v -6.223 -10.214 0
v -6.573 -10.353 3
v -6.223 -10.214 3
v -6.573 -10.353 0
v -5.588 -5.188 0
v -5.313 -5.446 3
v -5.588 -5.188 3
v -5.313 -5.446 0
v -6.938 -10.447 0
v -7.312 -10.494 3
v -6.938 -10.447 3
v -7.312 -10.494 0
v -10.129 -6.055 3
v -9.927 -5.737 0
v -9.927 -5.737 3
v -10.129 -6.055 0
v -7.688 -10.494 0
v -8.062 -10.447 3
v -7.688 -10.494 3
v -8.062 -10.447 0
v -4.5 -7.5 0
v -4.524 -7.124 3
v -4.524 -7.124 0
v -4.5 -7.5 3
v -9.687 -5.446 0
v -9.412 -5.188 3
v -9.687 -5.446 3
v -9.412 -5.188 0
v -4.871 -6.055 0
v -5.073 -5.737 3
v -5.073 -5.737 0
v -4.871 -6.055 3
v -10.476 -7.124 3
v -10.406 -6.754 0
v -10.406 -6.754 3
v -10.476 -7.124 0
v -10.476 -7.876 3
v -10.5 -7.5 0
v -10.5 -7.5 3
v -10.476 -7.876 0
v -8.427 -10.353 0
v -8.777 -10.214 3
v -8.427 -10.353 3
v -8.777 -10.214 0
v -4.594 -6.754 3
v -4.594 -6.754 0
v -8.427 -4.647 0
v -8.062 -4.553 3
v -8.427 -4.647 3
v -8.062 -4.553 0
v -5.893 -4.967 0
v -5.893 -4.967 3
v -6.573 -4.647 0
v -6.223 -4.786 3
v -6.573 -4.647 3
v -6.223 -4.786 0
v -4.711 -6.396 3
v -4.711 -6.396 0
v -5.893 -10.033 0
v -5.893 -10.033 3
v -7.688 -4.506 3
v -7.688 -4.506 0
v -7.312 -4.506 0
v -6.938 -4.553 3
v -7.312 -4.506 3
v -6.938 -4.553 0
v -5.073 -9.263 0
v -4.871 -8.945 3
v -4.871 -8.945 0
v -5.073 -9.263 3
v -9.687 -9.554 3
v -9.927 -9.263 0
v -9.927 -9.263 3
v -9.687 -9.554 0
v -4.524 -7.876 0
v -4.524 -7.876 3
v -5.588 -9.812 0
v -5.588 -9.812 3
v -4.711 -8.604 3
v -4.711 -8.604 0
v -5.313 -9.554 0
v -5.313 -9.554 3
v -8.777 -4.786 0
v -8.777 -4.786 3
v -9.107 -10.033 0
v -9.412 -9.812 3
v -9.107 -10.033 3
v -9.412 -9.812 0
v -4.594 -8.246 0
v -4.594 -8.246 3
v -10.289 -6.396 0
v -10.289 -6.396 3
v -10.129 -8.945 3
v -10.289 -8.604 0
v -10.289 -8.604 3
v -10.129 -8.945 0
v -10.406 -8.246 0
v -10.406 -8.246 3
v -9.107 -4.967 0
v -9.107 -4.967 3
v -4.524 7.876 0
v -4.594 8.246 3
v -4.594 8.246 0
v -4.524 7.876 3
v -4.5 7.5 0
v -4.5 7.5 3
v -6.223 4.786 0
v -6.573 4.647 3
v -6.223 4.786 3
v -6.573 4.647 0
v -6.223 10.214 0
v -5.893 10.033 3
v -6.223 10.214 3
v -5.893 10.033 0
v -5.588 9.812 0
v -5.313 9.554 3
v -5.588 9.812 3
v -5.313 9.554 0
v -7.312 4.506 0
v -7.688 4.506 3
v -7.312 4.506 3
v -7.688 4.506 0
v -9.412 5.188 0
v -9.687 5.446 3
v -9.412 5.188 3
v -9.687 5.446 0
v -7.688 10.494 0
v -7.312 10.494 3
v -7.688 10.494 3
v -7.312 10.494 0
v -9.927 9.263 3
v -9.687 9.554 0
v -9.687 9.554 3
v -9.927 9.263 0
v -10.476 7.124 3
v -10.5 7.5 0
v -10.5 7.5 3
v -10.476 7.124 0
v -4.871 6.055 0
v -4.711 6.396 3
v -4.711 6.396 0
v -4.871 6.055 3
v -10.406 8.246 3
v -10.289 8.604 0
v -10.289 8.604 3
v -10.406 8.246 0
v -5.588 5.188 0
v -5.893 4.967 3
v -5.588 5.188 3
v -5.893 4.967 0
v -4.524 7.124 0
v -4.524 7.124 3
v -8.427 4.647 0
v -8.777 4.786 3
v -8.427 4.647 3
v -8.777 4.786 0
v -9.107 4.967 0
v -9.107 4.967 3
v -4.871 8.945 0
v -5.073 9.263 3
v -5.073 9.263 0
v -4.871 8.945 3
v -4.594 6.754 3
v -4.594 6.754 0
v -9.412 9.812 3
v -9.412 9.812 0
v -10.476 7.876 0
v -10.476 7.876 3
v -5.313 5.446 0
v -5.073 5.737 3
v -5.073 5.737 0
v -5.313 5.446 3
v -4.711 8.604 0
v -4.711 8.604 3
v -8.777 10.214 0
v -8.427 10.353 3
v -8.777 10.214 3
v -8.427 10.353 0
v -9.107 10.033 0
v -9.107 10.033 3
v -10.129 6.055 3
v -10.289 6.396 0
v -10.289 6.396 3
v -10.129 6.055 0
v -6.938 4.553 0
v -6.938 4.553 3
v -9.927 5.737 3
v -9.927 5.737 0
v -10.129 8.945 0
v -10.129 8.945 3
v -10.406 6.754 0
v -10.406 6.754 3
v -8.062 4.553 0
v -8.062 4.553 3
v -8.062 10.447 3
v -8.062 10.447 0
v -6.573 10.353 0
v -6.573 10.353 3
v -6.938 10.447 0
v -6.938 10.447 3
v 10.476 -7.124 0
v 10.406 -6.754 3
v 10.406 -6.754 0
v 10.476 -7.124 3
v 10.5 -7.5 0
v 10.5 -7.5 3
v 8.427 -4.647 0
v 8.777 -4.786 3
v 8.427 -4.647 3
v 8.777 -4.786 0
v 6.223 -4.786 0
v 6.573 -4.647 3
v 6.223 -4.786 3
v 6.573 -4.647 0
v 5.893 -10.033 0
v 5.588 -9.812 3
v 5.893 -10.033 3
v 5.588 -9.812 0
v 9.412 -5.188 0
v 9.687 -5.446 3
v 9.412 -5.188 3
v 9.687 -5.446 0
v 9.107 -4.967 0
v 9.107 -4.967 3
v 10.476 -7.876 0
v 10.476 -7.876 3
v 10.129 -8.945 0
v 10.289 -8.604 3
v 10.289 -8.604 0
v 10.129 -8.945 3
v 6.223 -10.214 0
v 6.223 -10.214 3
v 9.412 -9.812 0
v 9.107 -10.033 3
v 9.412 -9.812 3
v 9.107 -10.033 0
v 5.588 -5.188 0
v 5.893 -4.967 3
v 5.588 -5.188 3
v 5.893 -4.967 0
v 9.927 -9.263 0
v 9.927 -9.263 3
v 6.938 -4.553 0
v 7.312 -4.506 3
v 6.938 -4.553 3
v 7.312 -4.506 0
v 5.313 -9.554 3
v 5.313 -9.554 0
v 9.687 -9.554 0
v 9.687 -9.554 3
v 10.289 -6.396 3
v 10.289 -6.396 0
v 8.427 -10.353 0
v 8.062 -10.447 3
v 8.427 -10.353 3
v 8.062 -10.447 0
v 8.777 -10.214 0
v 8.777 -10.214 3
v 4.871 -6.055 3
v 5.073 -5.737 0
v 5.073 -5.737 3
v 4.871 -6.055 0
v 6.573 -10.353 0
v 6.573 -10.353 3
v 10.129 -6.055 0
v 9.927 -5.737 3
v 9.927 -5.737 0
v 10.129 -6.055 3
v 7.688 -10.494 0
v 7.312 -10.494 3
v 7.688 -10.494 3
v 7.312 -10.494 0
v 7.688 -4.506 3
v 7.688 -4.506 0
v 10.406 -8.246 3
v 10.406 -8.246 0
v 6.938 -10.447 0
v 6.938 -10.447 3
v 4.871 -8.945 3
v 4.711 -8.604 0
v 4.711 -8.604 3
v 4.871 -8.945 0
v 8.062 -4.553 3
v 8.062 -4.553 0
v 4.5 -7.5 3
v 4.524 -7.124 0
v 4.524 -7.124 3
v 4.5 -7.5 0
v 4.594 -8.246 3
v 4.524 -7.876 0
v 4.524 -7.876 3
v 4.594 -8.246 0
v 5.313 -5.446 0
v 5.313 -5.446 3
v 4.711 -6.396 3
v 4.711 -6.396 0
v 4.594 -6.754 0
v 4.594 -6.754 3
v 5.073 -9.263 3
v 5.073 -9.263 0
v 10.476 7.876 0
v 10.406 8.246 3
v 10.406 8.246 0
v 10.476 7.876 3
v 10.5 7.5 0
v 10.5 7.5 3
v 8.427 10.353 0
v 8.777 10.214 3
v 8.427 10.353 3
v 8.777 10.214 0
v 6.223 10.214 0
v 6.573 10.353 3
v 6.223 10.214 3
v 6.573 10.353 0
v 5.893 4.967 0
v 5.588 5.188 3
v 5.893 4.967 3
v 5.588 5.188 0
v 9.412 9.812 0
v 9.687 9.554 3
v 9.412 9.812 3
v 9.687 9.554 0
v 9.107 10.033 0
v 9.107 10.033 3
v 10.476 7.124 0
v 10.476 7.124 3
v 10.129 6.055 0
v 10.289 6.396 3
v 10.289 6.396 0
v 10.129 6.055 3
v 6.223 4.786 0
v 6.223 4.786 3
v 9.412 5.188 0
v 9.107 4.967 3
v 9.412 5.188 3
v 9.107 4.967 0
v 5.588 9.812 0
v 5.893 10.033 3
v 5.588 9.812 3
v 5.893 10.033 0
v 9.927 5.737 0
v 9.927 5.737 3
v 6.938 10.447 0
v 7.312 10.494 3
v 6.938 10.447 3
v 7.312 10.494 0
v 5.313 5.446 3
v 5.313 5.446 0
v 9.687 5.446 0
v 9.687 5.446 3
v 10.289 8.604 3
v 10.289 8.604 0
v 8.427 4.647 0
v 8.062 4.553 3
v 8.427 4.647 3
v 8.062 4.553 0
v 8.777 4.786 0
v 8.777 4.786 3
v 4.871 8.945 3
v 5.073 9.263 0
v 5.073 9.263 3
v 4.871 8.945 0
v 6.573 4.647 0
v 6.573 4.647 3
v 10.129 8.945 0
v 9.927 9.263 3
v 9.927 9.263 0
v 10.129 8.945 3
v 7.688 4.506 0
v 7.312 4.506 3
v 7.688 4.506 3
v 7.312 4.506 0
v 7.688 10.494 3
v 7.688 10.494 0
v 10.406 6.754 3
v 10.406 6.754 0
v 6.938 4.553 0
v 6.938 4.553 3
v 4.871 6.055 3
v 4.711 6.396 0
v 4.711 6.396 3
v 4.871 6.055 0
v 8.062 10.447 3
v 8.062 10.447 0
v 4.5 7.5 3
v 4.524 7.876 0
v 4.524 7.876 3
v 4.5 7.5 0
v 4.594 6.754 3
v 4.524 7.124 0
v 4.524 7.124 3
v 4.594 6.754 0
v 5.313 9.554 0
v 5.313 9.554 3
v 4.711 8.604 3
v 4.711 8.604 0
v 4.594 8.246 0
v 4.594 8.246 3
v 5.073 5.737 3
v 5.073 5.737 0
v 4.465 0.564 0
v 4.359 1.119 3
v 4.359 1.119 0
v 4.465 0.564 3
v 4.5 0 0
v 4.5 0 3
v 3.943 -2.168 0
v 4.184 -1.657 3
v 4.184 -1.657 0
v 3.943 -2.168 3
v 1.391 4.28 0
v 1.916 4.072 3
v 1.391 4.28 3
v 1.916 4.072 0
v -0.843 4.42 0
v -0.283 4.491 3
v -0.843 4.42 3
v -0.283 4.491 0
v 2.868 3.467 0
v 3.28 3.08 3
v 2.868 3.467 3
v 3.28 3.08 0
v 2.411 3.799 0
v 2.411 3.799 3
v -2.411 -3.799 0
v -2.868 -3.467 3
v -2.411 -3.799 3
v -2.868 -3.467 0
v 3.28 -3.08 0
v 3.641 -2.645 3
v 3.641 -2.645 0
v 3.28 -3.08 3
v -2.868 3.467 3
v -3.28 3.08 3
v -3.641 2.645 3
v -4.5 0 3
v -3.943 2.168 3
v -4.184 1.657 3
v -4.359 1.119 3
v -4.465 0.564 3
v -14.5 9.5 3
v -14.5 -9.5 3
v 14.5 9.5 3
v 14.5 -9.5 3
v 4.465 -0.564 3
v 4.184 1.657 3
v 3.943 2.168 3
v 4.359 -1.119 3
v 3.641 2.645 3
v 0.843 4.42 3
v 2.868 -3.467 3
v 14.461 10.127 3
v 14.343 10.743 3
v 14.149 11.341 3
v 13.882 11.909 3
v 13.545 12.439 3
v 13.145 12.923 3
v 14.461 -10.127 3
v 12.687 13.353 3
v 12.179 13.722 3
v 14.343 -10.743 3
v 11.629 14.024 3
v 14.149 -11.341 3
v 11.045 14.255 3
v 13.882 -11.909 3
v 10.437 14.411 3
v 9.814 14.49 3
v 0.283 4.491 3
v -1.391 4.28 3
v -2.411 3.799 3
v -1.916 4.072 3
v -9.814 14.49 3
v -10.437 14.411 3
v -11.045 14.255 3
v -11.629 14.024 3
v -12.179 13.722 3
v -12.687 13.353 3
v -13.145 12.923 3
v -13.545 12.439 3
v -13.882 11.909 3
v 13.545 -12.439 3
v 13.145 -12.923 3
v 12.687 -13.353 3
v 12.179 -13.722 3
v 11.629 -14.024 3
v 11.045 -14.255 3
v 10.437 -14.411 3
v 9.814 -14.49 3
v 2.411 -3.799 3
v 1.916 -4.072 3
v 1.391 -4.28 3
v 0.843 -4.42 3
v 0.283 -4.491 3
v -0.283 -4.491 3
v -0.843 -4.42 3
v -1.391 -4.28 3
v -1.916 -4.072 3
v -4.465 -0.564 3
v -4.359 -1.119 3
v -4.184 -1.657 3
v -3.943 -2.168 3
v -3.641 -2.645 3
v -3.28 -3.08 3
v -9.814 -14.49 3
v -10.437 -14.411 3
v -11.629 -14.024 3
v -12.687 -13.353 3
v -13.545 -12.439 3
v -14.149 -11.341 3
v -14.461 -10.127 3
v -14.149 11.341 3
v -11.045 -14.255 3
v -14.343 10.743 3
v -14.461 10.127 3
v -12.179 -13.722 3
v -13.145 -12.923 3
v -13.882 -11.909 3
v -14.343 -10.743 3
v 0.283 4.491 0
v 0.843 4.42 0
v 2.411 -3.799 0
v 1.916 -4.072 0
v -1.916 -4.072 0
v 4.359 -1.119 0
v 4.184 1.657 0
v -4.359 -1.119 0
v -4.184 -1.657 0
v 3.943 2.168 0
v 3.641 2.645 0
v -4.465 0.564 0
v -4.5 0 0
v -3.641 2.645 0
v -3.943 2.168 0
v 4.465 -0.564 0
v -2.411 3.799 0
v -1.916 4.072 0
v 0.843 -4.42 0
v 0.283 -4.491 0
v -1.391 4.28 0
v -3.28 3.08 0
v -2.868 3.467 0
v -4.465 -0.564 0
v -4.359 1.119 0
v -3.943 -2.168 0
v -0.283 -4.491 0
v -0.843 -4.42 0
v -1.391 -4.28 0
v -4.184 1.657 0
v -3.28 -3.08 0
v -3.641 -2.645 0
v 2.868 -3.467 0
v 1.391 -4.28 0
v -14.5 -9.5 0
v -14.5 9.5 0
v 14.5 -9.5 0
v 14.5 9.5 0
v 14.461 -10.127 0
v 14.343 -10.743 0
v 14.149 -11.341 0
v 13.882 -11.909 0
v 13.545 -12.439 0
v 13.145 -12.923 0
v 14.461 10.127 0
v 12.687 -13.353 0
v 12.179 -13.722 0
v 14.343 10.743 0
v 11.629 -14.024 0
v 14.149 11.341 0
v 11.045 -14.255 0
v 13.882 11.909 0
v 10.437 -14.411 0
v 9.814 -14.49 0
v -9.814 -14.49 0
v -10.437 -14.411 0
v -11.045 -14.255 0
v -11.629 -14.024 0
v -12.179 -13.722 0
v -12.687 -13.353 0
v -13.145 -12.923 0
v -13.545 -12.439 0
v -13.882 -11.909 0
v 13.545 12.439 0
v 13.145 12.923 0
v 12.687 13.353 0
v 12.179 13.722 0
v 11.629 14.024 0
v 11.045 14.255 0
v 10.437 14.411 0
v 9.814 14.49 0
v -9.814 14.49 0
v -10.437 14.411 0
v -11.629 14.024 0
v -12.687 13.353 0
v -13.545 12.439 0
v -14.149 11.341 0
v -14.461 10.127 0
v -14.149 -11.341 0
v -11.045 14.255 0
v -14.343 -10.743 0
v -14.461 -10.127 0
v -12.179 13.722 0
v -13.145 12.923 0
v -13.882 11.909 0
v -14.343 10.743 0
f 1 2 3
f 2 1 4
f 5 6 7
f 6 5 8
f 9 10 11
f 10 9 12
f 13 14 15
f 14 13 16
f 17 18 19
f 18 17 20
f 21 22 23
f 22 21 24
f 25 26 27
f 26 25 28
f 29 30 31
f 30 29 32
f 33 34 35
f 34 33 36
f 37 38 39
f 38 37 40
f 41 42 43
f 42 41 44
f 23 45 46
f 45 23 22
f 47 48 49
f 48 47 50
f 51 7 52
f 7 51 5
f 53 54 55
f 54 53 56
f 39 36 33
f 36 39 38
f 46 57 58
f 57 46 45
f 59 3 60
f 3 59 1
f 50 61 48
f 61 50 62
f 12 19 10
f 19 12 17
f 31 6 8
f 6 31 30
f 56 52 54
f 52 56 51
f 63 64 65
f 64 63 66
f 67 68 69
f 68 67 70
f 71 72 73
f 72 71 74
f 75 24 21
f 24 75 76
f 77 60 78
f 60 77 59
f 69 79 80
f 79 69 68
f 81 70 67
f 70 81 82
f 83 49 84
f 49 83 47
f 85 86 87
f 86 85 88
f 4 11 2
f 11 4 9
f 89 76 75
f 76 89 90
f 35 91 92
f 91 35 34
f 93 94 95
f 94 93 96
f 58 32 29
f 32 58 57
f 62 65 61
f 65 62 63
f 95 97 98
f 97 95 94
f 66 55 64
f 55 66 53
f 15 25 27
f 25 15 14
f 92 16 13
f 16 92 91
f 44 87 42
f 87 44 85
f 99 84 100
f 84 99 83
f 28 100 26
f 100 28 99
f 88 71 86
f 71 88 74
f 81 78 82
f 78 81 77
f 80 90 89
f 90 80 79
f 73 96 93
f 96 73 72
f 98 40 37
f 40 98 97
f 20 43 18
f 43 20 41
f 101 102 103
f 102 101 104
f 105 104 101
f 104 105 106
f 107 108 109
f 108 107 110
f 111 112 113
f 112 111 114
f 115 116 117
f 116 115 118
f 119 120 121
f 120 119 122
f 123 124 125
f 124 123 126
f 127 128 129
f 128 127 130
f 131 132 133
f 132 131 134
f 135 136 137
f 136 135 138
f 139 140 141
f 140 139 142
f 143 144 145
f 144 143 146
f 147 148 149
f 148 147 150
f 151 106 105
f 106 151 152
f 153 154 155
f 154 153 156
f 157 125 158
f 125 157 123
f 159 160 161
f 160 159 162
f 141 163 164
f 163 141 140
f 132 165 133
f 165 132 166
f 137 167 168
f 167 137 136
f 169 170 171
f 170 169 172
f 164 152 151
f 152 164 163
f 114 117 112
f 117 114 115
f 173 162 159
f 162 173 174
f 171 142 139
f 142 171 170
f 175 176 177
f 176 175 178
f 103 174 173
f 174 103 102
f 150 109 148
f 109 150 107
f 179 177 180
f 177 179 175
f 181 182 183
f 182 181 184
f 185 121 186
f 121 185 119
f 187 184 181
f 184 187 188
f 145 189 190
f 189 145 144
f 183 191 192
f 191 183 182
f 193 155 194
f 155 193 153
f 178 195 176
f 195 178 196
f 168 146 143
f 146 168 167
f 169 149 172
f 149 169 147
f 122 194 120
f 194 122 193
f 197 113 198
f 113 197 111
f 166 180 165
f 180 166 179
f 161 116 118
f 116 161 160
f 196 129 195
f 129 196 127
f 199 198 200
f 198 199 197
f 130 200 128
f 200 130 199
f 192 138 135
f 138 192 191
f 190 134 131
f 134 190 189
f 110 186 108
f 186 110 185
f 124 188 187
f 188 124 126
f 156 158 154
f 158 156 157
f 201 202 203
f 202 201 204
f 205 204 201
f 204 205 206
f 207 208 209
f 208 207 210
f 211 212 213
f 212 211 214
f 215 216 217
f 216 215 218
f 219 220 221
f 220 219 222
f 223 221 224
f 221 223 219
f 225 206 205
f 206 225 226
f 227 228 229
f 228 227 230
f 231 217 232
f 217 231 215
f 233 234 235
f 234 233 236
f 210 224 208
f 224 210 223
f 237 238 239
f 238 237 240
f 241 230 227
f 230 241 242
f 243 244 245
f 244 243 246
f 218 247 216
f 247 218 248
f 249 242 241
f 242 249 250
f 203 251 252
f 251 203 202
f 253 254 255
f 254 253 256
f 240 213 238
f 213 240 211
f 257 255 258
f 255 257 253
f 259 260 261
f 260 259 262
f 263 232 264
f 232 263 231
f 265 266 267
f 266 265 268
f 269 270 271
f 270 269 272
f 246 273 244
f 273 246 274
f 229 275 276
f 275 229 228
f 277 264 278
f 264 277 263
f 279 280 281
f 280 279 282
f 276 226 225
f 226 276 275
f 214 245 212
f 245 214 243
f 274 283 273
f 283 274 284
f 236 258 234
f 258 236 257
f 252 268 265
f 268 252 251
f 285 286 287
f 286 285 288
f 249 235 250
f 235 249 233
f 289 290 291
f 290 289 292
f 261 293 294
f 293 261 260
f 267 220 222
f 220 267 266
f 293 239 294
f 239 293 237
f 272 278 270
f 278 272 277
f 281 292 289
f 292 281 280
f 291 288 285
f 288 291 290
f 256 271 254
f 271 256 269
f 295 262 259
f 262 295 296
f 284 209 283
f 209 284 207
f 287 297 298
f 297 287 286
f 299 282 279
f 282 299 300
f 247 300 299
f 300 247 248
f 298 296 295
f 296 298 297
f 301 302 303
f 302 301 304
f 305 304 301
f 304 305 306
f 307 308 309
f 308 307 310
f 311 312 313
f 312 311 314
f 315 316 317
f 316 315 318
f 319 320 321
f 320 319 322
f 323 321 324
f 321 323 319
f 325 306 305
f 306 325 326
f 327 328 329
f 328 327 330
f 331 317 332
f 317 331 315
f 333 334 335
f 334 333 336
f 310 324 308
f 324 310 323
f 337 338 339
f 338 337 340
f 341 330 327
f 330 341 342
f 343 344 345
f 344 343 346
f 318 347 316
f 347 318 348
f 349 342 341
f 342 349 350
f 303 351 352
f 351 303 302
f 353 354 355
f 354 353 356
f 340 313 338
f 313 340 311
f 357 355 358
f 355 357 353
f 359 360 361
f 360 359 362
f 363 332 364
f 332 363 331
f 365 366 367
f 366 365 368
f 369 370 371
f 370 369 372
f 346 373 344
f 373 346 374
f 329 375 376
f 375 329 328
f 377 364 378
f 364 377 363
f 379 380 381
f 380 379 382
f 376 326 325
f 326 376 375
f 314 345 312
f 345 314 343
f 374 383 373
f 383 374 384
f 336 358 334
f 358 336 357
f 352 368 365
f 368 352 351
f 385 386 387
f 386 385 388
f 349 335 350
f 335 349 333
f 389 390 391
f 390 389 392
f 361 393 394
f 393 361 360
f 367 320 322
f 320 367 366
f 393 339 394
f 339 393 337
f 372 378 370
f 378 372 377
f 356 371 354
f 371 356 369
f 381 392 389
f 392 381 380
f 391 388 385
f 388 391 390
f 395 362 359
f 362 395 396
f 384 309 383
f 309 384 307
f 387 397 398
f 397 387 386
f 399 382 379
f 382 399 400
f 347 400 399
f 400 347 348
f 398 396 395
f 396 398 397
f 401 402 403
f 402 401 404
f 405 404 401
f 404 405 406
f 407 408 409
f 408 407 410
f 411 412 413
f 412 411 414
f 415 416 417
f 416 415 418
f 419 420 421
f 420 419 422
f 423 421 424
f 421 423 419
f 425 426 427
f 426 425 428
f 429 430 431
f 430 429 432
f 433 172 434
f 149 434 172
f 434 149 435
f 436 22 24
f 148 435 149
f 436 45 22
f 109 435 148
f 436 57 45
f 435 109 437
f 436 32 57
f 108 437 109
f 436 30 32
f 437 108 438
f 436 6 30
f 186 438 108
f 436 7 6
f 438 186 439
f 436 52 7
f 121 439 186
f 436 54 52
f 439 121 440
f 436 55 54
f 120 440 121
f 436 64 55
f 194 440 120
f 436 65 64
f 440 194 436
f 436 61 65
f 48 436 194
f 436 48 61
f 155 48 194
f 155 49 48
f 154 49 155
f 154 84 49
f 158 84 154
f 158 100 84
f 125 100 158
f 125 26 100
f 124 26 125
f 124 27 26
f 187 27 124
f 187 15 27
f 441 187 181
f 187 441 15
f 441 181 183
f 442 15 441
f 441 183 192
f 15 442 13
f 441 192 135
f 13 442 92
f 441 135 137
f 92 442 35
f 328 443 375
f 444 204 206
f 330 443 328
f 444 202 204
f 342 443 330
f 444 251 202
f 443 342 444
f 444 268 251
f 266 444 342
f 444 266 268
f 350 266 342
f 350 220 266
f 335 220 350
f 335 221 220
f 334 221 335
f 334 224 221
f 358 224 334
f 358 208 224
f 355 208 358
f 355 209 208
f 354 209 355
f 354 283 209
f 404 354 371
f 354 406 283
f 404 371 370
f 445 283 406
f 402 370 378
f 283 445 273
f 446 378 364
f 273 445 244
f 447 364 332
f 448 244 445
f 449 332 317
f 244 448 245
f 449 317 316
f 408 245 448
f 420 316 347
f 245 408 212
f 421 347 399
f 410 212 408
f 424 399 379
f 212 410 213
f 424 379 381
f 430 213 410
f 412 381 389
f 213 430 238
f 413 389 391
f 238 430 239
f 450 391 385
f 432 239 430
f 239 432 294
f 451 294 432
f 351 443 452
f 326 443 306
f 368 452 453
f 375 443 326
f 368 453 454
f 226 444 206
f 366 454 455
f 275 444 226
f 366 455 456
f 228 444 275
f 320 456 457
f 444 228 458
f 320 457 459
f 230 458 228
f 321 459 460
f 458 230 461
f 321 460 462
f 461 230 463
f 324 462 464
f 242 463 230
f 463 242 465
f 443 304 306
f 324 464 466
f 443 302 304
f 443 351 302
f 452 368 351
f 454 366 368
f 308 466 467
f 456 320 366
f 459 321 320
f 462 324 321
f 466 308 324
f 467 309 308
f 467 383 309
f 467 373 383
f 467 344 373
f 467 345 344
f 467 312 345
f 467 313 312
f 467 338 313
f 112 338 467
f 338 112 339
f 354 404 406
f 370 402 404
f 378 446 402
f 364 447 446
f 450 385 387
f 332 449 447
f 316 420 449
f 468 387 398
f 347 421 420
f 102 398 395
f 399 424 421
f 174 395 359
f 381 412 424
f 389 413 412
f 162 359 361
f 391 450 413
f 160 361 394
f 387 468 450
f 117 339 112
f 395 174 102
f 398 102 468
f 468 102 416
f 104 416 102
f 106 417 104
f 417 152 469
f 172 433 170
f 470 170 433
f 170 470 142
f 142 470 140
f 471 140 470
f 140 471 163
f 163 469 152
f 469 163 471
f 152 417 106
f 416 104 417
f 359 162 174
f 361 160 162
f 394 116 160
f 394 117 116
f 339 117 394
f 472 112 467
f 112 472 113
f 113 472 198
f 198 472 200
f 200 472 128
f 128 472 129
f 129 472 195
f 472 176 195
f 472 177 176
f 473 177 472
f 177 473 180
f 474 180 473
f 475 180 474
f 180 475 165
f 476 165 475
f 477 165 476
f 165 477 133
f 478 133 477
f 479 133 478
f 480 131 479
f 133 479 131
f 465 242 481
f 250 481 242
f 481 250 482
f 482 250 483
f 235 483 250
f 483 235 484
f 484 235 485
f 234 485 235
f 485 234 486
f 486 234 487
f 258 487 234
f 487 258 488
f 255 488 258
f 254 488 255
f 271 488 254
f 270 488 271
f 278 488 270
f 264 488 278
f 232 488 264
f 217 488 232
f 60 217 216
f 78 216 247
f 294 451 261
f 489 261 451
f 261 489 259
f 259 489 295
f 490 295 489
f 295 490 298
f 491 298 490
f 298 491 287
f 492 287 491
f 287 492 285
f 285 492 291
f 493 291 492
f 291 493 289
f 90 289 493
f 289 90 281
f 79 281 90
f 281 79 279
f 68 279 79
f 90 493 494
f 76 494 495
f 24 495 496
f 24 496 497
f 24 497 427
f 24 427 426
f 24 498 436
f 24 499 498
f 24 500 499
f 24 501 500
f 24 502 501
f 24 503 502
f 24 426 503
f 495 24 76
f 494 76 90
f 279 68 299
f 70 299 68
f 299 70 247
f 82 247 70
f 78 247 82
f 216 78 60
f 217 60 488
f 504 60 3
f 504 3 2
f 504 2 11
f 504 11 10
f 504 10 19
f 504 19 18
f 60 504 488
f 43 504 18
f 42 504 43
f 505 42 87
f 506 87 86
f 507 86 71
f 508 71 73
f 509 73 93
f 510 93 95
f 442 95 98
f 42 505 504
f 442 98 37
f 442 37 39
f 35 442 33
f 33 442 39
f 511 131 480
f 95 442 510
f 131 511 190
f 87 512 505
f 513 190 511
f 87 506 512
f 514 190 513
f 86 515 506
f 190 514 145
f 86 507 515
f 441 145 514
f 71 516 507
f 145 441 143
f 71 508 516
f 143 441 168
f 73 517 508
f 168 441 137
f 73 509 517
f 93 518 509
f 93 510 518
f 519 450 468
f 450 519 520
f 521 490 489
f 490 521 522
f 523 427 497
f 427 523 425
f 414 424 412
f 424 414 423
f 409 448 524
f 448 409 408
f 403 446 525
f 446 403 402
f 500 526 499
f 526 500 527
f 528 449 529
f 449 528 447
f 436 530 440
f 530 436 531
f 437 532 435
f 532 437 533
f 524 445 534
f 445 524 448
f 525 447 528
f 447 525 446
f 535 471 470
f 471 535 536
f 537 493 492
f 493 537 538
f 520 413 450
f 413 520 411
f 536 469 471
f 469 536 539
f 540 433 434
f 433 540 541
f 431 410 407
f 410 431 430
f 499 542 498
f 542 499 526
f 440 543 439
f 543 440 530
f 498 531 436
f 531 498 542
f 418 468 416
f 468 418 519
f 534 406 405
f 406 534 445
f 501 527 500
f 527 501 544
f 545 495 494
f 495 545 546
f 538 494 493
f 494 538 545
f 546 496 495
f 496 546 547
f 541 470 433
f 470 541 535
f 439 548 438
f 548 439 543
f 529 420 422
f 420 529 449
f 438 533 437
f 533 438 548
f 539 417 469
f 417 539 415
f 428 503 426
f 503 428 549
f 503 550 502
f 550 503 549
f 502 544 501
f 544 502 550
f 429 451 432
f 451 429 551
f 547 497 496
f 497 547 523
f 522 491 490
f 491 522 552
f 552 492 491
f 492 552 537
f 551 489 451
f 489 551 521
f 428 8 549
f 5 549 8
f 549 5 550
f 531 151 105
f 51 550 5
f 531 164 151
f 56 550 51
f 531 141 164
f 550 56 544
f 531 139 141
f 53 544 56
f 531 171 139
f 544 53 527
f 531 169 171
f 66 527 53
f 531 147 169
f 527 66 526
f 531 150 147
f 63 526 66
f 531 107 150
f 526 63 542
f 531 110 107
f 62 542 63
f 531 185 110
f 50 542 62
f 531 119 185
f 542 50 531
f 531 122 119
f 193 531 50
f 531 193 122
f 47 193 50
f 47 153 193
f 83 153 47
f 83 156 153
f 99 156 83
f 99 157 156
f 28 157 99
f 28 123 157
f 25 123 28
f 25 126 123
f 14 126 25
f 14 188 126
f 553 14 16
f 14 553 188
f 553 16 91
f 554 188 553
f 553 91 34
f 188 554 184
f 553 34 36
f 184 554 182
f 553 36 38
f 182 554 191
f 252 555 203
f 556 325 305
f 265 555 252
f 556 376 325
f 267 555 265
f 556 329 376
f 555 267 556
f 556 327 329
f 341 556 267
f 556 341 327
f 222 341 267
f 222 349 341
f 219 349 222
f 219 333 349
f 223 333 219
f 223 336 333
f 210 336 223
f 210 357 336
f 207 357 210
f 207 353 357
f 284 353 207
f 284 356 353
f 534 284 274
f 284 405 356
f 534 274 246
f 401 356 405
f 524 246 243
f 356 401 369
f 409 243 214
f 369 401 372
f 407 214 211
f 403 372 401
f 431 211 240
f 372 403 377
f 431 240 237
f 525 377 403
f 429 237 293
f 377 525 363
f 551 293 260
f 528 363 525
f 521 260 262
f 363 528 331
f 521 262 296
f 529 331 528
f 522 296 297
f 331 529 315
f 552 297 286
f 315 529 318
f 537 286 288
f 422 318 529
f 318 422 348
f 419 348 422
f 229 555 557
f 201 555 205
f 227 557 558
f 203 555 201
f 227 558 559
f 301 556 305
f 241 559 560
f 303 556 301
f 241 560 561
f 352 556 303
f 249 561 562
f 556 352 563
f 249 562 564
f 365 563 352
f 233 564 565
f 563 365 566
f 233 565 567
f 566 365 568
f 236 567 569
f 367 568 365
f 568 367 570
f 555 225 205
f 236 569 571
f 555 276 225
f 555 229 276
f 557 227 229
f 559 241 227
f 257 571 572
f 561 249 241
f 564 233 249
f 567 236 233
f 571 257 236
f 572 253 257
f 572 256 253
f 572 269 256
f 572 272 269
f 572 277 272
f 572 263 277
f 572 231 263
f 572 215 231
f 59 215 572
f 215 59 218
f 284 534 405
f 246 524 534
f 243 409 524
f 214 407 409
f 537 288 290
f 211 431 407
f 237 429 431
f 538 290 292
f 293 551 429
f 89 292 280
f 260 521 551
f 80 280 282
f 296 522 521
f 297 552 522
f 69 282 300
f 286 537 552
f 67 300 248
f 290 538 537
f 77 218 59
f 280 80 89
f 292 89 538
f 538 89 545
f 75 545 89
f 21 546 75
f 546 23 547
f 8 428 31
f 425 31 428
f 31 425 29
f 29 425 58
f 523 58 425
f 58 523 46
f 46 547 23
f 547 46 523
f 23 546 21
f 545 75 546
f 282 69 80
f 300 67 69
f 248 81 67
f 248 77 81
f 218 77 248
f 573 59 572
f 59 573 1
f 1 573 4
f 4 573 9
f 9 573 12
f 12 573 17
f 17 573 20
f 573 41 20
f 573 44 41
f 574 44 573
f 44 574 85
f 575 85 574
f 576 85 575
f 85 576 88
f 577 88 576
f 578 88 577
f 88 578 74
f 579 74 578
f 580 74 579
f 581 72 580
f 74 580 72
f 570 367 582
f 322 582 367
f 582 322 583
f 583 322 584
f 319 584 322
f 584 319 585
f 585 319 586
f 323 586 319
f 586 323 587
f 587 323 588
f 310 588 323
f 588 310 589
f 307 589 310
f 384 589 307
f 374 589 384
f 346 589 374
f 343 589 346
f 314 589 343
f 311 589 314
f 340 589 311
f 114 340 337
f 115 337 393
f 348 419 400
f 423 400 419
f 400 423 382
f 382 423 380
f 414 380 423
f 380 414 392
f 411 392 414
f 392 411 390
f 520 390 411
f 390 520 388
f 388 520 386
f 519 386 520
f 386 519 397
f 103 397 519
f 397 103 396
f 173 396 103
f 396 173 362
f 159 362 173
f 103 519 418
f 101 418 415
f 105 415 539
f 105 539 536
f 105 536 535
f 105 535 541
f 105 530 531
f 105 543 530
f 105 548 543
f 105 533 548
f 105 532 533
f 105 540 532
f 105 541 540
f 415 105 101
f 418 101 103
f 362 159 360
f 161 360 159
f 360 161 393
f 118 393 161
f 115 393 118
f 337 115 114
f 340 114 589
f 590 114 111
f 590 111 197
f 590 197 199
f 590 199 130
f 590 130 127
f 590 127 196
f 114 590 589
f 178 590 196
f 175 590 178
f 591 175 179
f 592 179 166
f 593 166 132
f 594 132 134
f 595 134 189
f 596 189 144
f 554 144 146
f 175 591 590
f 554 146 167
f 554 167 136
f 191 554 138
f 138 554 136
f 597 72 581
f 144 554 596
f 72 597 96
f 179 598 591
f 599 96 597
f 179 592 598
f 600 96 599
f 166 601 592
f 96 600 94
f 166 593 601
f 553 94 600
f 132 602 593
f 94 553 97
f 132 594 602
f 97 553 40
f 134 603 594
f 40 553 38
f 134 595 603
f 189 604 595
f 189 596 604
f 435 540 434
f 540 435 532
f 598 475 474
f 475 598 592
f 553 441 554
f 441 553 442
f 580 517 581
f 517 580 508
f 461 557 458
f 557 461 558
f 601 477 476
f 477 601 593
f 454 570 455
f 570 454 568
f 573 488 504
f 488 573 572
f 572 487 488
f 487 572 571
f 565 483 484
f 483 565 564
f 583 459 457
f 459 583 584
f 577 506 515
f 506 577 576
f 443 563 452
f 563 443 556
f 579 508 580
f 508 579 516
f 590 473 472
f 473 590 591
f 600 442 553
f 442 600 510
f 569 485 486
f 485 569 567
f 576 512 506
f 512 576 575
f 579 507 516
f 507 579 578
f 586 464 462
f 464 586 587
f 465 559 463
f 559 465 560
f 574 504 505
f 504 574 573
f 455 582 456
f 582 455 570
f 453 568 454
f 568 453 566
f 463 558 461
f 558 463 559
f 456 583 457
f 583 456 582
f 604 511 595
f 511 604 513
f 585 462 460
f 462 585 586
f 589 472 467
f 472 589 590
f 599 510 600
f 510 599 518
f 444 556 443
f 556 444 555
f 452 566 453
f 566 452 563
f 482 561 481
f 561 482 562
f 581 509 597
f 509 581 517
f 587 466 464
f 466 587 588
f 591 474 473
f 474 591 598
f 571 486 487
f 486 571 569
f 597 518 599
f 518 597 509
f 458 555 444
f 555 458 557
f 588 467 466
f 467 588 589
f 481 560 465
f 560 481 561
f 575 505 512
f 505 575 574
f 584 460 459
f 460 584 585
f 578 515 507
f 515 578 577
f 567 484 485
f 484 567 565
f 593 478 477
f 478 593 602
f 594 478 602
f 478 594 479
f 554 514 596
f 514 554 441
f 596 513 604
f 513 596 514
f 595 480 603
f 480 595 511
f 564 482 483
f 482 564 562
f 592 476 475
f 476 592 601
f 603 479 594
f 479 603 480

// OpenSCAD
$fn = 50;


difference() {
	union() {
		hull() {
			translate(v = [-9.5000000000, 9.5000000000, 0]) {
				cylinder(h = 3, r = 5);
			}
			translate(v = [9.5000000000, 9.5000000000, 0]) {
				cylinder(h = 3, r = 5);
			}
			translate(v = [-9.5000000000, -9.5000000000, 0]) {
				cylinder(h = 3, r = 5);
			}
			translate(v = [9.5000000000, -9.5000000000, 0]) {
				cylinder(h = 3, r = 5);
			}
		}
	}
	union() {
		#translate(v = [-7.5000000000, -7.5000000000, -100.0000000000]) {
			cylinder(h = 200, r = 3.0000000000);
		}
		#translate(v = [-7.5000000000, 7.5000000000, -100.0000000000]) {
			cylinder(h = 200, r = 3.0000000000);
		}
		#translate(v = [7.5000000000, -7.5000000000, -100.0000000000]) {
			cylinder(h = 200, r = 3.0000000000);
		}
		#translate(v = [7.5000000000, 7.5000000000, -100.0000000000]) {
			cylinder(h = 200, r = 3.0000000000);
		}
		#cylinder(h = 3, r = 4.5000000000);
	}
}
